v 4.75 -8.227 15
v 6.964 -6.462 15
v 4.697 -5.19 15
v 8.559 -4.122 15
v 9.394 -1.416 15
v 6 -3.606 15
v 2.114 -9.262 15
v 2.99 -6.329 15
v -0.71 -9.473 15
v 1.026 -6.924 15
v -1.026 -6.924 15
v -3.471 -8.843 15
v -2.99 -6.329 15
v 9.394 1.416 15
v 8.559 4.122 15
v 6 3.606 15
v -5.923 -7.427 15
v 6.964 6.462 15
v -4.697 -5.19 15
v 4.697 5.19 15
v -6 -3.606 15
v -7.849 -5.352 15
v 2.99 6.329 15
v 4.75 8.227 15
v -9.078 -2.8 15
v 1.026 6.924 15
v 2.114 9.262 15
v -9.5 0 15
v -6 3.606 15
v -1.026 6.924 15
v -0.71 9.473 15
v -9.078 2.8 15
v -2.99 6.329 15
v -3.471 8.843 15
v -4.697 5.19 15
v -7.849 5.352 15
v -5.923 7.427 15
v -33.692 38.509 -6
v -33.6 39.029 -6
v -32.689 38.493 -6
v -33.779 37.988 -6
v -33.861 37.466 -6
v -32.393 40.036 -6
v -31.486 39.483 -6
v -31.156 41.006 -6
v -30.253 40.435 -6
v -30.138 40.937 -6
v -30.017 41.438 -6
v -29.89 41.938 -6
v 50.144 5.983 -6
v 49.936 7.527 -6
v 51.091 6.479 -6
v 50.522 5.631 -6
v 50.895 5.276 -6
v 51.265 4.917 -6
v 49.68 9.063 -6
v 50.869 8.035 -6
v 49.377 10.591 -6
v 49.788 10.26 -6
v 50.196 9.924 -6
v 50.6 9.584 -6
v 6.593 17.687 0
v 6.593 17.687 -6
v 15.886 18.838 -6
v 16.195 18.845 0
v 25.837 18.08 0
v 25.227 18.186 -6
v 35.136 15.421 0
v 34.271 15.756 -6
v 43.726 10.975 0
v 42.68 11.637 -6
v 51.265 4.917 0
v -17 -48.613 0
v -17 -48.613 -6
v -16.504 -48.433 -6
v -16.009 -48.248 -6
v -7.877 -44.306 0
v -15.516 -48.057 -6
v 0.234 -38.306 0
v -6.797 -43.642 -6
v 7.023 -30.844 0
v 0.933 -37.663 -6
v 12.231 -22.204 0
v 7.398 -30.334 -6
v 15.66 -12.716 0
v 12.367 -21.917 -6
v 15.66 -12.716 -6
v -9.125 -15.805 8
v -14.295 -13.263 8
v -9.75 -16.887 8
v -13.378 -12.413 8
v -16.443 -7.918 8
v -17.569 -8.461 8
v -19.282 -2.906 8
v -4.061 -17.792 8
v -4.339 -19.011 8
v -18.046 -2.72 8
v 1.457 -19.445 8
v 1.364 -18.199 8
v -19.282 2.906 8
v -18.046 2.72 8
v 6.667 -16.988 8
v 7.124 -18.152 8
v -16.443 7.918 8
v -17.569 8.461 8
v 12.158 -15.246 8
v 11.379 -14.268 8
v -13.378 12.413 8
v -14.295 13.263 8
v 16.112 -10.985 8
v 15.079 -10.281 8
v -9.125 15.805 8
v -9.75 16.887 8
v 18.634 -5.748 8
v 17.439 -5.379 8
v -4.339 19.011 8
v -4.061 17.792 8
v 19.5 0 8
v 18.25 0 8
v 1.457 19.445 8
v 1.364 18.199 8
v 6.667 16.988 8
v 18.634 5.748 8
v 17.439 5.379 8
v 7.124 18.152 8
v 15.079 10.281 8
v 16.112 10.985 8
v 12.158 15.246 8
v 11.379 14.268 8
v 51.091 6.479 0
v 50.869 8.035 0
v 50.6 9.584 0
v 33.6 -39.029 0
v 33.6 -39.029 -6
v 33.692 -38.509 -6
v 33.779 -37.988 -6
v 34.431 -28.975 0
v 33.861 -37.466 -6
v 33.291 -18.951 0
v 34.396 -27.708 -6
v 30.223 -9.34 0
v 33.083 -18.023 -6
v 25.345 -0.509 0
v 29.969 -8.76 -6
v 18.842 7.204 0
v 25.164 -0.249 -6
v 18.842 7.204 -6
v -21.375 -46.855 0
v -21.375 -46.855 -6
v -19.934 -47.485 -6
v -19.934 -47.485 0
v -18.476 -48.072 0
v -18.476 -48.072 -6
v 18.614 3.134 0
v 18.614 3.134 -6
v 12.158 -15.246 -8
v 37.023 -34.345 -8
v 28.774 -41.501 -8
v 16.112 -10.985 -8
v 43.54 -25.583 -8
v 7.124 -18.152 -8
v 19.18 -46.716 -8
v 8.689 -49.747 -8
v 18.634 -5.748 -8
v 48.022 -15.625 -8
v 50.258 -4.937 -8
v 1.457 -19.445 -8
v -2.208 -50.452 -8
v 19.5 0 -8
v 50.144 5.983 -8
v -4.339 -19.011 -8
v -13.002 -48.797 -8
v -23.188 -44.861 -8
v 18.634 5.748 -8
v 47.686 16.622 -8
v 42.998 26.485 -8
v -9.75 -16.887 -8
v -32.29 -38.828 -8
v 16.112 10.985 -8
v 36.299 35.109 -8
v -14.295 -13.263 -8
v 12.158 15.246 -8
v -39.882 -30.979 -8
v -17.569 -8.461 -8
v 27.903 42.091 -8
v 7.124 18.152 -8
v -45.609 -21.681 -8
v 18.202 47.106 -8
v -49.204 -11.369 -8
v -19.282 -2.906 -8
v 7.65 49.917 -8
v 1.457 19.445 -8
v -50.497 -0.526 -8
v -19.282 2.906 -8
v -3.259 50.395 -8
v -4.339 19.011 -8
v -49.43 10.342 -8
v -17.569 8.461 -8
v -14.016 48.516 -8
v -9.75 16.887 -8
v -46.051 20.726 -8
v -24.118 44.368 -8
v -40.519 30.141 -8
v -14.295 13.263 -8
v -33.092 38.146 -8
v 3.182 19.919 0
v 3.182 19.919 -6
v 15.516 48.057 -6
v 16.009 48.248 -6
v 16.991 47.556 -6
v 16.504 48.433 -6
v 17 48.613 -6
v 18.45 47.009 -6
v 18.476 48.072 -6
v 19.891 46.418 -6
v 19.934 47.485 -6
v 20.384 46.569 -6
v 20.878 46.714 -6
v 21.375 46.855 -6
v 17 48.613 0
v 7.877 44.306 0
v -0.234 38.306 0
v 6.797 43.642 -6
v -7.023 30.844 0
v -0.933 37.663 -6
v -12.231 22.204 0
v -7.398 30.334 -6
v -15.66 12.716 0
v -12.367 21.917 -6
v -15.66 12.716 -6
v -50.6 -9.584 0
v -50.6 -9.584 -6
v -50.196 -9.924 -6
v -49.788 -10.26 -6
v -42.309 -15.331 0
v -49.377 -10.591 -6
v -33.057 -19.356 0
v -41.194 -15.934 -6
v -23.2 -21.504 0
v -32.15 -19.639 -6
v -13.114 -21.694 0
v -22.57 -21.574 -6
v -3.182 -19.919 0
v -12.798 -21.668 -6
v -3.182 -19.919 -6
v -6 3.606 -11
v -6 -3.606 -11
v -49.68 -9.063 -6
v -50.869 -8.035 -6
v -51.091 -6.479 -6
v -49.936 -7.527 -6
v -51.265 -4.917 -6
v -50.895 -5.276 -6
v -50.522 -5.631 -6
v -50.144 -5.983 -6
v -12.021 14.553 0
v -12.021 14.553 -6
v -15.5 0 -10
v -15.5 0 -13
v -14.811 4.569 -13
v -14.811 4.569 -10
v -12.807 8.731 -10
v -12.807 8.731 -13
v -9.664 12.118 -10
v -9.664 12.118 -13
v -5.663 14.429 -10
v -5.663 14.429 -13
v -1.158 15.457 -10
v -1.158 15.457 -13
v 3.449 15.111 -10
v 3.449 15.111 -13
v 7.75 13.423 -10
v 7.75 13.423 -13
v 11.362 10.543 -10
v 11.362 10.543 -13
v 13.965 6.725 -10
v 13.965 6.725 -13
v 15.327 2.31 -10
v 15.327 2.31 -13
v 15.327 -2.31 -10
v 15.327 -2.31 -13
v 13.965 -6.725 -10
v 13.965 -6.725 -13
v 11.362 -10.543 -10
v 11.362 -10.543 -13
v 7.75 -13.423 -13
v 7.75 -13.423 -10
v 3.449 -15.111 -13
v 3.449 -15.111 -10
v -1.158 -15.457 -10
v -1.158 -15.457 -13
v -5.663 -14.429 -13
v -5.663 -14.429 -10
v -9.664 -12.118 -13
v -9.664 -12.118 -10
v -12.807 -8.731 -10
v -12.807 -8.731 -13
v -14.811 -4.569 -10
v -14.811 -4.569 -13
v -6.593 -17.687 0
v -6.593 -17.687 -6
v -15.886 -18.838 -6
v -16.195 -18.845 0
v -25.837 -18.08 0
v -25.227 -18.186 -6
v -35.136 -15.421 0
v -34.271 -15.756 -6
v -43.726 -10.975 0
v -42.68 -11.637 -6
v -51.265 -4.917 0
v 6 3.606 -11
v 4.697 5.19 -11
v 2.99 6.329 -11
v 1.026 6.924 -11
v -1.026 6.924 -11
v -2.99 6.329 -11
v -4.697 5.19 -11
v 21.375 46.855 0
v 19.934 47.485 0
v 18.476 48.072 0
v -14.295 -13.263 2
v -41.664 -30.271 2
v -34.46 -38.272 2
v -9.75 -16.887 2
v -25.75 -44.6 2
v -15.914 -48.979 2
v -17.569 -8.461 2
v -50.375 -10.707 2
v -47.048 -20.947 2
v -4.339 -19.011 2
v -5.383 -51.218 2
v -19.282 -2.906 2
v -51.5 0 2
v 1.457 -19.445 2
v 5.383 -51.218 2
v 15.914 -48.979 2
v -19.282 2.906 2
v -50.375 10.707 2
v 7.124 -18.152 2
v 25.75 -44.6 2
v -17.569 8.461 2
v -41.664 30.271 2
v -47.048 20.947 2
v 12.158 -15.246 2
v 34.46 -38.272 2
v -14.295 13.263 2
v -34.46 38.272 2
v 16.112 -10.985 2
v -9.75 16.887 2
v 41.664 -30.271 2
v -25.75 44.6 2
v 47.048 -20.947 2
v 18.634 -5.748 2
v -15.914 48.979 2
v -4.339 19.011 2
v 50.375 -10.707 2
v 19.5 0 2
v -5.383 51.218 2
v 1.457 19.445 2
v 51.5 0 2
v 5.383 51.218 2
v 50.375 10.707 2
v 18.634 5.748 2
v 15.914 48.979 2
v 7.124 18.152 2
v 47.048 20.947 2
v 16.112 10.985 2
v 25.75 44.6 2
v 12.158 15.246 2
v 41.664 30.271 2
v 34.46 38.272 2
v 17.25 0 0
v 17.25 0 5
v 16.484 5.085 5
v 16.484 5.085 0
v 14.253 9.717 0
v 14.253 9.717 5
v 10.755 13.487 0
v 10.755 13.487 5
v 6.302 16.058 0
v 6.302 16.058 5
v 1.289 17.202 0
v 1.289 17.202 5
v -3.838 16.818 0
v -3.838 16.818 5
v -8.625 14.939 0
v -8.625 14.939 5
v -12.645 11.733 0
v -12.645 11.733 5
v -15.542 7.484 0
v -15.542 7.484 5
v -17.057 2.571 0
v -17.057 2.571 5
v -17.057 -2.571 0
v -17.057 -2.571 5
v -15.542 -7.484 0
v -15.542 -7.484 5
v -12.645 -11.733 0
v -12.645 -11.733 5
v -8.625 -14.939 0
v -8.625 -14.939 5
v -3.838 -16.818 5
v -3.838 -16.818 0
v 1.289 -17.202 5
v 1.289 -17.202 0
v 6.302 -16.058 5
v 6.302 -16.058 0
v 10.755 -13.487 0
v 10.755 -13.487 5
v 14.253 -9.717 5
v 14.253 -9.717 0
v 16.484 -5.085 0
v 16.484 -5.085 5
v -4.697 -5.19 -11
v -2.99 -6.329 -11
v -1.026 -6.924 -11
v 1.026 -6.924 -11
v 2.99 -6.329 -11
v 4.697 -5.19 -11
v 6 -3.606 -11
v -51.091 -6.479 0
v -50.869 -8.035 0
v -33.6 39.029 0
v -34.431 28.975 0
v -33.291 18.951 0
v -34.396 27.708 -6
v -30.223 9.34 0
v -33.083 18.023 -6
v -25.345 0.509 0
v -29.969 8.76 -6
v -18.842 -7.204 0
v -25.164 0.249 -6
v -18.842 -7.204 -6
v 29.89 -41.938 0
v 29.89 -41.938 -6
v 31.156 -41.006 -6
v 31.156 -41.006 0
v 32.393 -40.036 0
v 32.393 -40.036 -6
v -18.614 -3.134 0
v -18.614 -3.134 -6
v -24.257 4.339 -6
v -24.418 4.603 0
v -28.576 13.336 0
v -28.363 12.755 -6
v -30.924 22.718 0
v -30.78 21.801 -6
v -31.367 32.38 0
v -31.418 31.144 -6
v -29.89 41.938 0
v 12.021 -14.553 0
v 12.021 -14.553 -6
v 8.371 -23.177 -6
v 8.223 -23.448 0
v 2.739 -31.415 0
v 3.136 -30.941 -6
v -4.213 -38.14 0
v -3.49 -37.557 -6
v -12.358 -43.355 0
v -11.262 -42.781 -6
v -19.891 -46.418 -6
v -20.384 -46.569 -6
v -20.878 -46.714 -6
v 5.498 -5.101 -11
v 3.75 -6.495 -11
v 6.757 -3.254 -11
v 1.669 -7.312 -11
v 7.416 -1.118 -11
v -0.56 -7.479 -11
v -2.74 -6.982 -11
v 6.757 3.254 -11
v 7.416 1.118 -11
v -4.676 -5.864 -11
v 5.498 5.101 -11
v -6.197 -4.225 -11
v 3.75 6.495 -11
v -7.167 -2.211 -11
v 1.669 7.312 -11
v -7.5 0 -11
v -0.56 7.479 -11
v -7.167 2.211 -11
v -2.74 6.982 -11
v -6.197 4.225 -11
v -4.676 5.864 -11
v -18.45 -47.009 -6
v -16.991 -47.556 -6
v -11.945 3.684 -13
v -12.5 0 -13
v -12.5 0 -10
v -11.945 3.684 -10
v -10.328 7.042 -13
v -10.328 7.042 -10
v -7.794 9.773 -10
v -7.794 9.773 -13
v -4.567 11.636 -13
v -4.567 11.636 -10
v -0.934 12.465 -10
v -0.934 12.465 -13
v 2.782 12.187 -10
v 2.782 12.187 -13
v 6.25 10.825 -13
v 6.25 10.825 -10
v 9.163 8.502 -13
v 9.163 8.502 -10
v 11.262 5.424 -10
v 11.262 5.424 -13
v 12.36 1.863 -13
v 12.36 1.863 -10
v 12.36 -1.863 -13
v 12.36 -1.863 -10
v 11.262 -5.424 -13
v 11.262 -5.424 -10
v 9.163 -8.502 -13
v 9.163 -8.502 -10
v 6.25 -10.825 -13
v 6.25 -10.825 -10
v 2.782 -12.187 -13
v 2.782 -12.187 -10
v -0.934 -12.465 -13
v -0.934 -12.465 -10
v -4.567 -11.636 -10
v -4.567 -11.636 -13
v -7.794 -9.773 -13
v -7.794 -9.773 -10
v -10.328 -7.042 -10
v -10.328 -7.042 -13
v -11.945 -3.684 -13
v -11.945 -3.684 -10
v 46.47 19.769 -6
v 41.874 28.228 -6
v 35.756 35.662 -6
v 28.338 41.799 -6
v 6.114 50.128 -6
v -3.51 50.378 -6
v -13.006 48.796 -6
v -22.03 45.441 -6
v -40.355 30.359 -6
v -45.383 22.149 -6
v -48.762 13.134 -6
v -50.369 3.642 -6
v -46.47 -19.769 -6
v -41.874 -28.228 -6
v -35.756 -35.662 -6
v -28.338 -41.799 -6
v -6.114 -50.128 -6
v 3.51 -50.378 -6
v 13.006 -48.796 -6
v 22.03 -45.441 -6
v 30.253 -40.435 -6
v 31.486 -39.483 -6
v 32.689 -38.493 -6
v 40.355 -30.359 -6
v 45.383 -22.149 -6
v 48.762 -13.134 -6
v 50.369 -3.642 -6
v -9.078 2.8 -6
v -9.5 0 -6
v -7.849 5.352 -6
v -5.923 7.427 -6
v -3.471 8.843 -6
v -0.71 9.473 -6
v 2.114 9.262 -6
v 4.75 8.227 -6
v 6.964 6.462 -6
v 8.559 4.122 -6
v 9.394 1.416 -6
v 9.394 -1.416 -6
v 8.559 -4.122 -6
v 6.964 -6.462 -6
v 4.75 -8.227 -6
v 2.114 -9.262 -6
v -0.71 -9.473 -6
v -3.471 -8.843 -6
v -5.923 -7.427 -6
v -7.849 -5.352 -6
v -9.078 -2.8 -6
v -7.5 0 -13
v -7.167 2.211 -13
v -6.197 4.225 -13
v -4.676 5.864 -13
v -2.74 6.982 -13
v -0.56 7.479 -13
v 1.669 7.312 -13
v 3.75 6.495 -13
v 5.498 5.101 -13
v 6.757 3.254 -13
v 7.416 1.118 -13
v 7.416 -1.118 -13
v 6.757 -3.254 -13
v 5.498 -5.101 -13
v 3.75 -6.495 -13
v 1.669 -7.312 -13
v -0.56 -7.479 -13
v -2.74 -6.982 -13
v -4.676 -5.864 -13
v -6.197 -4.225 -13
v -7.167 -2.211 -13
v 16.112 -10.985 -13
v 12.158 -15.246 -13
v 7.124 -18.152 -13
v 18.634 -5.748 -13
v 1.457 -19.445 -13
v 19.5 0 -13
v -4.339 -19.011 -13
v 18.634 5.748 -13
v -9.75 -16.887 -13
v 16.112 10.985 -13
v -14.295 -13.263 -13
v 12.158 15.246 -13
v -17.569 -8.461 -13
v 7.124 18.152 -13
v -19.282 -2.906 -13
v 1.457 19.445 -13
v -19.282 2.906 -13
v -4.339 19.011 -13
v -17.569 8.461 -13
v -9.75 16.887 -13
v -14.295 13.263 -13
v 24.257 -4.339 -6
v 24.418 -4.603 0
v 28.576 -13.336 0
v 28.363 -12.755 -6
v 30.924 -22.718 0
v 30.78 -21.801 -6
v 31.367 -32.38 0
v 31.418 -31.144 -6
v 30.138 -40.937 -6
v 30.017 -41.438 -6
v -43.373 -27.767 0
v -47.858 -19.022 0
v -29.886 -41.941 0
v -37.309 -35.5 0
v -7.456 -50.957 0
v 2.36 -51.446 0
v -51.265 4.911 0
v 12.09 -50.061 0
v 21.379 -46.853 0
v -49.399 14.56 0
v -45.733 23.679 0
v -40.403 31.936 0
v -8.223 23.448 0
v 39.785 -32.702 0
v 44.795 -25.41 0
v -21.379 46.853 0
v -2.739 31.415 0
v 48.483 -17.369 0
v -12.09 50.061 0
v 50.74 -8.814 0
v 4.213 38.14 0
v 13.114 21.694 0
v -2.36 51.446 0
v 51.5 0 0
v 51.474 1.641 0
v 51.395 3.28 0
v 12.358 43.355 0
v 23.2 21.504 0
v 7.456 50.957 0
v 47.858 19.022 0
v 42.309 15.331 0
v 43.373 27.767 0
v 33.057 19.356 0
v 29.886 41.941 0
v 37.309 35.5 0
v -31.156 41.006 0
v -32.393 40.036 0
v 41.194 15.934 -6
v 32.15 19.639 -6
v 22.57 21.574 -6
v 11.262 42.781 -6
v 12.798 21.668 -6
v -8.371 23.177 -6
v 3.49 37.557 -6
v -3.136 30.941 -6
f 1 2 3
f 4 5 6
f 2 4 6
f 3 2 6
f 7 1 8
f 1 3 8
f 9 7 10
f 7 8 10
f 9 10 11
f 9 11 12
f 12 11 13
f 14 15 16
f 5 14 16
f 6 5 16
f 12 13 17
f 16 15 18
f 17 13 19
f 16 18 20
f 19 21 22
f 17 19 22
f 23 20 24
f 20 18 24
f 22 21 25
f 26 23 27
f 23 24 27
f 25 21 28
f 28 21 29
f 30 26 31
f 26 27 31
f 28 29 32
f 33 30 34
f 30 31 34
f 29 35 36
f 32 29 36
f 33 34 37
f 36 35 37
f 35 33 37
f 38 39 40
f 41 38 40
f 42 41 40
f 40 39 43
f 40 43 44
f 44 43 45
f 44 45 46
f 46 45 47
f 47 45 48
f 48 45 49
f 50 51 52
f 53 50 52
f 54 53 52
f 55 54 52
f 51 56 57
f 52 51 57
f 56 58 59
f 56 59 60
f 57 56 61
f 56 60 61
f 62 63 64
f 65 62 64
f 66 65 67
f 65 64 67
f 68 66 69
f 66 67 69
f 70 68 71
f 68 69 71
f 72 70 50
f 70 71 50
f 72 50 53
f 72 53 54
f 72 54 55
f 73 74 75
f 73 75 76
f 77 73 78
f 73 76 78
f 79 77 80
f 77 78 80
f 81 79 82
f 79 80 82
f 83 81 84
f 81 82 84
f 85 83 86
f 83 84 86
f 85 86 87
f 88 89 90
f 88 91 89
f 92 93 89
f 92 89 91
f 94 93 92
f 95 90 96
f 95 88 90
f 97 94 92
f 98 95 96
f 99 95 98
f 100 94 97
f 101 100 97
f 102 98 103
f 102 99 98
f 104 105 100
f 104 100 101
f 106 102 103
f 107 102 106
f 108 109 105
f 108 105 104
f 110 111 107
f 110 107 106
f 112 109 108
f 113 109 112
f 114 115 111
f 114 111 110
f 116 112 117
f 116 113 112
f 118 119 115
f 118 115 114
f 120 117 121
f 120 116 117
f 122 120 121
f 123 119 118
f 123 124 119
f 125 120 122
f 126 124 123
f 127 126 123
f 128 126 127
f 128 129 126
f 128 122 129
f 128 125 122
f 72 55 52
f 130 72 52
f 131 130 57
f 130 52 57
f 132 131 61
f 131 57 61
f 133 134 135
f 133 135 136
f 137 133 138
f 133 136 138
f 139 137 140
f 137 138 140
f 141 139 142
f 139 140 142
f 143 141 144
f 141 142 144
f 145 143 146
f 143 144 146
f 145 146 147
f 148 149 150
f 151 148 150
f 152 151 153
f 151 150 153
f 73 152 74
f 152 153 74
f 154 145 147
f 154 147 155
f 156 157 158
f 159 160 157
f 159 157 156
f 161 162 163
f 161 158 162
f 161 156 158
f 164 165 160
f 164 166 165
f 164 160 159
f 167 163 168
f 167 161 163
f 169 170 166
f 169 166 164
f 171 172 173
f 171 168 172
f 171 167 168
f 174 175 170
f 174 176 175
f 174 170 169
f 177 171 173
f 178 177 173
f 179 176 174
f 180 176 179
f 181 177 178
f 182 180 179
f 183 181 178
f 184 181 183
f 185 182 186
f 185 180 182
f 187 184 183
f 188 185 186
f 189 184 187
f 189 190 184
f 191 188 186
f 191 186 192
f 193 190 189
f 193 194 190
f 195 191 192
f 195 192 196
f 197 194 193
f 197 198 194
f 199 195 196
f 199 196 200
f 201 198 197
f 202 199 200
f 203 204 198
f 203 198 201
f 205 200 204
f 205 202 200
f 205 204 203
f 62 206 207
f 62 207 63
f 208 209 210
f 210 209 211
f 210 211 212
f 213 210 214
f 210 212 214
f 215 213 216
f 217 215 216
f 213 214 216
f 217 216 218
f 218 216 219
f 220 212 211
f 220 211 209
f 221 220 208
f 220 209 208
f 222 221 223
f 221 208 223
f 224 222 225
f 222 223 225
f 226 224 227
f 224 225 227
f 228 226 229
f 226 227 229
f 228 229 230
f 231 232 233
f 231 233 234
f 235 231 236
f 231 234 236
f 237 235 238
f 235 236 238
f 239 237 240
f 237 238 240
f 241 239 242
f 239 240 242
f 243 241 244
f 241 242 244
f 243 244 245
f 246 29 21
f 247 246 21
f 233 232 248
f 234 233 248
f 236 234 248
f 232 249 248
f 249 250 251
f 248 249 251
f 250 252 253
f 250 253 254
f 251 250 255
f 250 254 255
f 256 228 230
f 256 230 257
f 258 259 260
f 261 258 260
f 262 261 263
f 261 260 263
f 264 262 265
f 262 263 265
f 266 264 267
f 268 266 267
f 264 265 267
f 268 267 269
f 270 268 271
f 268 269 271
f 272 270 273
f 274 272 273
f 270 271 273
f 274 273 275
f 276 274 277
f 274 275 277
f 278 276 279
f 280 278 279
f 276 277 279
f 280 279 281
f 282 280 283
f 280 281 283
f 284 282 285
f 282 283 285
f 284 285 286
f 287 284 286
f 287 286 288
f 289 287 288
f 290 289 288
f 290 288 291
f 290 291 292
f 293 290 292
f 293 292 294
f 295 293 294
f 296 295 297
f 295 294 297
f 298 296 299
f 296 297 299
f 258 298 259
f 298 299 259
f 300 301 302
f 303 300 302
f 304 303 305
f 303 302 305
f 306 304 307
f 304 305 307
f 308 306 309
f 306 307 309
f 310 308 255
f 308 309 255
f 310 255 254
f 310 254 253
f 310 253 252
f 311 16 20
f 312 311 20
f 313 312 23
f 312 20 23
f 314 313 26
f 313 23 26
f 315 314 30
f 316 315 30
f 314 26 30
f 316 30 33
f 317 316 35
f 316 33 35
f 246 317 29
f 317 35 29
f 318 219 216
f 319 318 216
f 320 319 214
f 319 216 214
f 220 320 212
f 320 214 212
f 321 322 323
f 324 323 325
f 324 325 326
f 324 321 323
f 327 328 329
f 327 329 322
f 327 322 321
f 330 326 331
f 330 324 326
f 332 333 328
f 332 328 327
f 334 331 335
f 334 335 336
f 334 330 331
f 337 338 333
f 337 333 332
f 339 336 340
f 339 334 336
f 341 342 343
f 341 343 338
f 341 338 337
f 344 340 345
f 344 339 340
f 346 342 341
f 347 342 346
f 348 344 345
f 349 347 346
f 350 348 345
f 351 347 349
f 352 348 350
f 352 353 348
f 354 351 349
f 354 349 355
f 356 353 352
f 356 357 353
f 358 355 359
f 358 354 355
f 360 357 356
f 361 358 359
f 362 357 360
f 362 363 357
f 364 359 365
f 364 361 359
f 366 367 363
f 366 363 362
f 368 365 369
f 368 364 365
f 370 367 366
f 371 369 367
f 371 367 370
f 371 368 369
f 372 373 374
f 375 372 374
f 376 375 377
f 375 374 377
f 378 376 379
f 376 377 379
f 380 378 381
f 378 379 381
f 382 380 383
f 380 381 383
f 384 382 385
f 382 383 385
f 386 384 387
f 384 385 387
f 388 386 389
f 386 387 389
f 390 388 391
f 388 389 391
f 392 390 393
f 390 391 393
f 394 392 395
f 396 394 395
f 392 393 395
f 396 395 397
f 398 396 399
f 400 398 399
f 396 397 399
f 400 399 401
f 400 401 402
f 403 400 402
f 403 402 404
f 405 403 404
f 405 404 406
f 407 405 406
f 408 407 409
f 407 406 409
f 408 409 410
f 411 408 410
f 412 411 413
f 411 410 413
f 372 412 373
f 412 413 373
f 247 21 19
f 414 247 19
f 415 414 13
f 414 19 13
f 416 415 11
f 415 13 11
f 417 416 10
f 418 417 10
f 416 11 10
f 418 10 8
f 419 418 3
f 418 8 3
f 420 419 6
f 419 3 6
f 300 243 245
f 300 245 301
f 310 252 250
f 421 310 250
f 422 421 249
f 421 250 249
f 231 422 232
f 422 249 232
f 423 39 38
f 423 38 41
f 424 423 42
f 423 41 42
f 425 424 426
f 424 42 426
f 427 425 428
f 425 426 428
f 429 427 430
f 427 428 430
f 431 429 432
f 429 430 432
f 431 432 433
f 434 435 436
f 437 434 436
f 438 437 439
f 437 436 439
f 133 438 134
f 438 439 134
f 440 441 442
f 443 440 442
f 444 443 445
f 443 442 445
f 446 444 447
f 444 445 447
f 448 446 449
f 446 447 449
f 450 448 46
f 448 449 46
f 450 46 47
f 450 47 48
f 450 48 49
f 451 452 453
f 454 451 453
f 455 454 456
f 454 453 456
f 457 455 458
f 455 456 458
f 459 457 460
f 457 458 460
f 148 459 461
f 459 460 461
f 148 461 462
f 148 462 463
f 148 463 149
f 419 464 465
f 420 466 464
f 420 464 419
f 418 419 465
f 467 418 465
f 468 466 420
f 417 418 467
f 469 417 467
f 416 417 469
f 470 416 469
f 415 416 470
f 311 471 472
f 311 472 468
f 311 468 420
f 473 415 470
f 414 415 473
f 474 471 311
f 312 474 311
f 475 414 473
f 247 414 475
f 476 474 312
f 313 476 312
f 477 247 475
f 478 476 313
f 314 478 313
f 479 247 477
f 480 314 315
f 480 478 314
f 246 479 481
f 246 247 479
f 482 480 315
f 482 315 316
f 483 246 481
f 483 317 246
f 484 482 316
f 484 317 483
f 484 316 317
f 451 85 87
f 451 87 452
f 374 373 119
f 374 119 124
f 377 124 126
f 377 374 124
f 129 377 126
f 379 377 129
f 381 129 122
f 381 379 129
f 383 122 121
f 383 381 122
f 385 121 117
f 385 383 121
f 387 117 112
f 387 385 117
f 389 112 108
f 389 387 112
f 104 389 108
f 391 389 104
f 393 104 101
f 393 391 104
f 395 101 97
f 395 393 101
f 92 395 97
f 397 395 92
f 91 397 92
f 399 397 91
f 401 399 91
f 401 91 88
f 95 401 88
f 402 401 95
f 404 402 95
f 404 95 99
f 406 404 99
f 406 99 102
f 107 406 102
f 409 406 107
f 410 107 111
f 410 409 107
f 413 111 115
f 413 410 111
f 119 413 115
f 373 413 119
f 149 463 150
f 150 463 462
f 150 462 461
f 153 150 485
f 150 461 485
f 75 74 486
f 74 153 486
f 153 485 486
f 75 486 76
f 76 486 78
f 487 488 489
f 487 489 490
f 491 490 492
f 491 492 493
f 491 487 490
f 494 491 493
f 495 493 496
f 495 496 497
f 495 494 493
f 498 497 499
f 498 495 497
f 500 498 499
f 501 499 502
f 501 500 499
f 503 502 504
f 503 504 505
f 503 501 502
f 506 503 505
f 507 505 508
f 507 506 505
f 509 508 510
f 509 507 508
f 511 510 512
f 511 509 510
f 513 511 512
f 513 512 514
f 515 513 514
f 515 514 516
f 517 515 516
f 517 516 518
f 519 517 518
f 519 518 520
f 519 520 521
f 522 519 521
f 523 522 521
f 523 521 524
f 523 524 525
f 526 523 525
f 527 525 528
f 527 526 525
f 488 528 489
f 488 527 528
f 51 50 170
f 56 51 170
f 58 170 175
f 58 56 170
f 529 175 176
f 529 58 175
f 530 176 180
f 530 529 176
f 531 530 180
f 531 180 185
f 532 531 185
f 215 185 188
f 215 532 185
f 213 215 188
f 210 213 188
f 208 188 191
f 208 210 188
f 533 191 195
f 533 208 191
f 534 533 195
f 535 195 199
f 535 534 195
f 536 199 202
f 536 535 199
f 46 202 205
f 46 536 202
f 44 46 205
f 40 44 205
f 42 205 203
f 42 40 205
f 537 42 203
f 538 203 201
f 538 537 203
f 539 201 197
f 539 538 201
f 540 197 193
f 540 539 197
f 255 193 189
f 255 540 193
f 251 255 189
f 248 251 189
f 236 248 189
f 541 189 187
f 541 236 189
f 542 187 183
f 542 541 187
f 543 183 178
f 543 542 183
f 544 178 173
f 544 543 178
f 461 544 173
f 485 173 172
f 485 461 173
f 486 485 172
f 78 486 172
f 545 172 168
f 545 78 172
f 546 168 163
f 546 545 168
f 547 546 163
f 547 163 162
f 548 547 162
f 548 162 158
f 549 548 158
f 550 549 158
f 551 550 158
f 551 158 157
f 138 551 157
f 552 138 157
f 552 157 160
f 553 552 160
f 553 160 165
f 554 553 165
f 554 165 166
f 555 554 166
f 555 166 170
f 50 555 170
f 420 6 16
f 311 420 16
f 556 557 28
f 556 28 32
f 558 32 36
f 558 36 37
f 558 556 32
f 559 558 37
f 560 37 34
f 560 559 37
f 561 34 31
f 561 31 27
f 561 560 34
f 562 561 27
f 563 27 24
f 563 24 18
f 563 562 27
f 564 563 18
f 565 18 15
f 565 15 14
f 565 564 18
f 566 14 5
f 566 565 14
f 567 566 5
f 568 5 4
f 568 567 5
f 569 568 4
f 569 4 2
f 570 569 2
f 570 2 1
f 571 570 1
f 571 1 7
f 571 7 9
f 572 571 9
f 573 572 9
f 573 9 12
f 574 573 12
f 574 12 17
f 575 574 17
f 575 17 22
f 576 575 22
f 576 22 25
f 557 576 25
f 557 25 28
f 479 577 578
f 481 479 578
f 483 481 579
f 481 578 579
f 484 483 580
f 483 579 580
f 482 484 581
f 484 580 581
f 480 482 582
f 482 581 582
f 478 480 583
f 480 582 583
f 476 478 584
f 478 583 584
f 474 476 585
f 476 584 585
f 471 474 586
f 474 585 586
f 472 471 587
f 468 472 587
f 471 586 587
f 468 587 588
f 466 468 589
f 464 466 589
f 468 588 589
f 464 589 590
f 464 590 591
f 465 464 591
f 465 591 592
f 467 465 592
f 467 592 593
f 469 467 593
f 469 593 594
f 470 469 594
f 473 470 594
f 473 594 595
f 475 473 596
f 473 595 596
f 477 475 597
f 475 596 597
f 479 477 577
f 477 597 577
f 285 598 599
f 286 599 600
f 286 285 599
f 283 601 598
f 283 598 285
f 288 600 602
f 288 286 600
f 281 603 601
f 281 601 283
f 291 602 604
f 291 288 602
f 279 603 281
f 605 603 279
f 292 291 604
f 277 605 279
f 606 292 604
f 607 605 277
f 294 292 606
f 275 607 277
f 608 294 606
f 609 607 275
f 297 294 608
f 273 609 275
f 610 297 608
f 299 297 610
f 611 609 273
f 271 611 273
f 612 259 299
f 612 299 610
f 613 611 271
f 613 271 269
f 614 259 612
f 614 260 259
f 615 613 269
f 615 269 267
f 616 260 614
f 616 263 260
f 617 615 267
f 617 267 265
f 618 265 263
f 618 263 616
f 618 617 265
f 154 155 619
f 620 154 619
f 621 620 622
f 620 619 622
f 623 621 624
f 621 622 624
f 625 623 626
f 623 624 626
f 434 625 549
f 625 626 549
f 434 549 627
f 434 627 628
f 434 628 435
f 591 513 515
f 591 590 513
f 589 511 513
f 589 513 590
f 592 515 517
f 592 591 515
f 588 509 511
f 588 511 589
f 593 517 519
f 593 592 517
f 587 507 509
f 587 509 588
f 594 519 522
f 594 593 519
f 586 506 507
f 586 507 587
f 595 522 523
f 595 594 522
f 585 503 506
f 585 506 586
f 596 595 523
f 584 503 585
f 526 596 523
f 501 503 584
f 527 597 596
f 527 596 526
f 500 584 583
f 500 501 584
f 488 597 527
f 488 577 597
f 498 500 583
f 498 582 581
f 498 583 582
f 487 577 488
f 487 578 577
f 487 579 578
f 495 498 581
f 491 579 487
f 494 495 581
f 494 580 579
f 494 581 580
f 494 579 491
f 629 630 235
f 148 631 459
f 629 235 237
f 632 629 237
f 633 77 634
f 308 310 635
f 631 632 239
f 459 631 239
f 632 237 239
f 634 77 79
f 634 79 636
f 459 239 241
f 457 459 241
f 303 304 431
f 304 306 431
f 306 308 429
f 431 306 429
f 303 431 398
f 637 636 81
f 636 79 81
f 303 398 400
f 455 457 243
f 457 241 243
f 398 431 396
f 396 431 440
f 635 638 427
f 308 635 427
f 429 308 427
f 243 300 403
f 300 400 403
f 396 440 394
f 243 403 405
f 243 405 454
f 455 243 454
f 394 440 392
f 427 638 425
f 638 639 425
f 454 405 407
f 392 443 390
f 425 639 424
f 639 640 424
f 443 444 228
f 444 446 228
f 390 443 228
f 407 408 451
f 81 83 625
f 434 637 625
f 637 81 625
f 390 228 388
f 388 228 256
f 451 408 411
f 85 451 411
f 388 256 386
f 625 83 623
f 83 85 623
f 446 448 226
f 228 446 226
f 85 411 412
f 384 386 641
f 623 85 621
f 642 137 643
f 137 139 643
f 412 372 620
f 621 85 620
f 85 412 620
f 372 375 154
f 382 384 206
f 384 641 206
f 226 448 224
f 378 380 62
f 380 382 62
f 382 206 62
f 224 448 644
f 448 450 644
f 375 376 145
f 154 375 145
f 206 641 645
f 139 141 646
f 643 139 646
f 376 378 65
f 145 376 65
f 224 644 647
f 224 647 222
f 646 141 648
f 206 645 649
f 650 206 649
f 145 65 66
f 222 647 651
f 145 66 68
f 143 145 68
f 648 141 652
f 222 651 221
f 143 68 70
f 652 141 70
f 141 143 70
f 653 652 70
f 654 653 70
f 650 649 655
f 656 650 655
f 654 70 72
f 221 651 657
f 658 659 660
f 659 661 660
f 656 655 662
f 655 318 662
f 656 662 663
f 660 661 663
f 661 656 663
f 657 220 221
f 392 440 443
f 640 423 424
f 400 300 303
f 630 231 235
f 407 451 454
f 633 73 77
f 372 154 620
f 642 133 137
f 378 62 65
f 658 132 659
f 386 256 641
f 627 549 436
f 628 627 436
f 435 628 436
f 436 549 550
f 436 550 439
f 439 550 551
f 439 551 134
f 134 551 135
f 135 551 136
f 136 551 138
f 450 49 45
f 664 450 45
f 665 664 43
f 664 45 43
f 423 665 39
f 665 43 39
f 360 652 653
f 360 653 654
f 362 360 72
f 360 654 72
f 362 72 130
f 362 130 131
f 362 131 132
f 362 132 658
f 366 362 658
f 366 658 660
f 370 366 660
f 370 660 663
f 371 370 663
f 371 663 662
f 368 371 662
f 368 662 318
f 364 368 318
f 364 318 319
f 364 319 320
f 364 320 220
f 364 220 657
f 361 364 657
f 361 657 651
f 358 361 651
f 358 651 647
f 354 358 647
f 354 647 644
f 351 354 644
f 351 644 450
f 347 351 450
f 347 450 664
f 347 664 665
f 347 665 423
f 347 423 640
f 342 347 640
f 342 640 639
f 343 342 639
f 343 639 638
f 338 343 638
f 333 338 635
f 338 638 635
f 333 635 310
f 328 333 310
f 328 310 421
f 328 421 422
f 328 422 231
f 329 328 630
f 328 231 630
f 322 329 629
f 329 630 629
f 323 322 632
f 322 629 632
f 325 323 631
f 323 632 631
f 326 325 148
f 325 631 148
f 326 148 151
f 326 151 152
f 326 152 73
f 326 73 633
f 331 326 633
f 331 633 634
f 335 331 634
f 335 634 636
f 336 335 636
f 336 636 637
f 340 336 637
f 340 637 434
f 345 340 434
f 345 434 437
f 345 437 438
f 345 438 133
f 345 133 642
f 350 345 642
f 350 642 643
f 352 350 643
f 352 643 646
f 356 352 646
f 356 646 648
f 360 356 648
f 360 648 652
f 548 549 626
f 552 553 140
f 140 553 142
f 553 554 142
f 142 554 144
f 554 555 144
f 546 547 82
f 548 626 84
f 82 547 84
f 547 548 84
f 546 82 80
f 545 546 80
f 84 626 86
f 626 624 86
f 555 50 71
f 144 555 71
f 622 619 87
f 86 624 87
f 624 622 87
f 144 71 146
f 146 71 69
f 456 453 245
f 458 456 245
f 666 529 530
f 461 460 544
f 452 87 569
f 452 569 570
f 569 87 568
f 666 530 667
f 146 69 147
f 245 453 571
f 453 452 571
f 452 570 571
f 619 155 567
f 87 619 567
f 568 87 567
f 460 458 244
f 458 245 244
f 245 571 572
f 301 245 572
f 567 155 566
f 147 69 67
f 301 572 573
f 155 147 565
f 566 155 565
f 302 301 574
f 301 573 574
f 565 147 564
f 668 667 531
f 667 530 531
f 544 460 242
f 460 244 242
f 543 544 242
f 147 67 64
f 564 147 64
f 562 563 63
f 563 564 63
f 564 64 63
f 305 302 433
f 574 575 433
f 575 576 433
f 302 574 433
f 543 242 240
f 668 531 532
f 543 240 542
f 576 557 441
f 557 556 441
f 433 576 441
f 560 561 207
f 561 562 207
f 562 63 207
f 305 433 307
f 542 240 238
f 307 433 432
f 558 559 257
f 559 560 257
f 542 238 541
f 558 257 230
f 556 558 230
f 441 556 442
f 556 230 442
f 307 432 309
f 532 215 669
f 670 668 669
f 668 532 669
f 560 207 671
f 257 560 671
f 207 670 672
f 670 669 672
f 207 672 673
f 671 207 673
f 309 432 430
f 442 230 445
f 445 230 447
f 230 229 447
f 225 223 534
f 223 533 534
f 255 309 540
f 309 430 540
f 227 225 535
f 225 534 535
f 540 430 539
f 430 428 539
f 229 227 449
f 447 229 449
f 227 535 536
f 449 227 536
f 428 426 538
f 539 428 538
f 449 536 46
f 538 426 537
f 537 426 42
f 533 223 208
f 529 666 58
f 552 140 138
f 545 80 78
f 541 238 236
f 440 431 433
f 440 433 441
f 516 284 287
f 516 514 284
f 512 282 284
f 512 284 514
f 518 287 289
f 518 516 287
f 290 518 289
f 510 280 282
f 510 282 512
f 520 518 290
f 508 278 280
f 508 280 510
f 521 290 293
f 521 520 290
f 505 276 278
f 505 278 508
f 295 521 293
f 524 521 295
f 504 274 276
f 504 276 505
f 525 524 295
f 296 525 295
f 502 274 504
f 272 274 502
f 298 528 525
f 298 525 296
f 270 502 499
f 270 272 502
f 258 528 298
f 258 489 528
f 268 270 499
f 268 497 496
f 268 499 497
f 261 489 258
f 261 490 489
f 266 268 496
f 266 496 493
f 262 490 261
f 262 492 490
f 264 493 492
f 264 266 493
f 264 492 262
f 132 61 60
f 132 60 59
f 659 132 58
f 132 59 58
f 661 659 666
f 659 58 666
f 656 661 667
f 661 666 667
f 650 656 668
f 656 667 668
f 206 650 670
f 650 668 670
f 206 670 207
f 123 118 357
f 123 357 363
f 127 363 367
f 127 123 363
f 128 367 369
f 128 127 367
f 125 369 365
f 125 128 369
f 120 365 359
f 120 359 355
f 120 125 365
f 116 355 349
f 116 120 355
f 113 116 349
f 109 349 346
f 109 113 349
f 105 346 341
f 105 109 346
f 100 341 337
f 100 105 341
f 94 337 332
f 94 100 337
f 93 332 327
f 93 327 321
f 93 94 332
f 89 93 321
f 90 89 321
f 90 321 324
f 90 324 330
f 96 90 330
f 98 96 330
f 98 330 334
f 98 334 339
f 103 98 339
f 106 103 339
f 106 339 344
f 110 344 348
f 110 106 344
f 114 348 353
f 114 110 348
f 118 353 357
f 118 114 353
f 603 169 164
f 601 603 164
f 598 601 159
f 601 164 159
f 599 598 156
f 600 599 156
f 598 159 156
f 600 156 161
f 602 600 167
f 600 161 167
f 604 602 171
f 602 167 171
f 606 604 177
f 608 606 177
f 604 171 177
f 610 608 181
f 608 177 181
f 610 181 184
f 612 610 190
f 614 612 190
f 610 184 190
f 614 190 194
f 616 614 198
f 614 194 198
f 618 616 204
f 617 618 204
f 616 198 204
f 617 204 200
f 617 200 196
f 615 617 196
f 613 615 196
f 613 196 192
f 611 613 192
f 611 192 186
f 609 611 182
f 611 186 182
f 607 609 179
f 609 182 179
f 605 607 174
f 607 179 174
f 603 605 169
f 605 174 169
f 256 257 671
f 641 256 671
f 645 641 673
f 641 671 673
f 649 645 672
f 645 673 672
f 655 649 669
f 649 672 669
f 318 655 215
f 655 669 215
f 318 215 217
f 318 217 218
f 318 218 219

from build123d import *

# Parameters (mm, degrees)
SKETCH1_R           = 51.5
BOSS_EXTRUDE1_DEPTH = 2
SKETCH2_R           = 17.25
CUT_EXTRUDE1_DEPTH  = 2
BOSS_EXTRUDE3_START = 6
BOSS_EXTRUDE3_DEPTH = 6
CIRPATTERN2_COUNT   = 6
BOSS_EXTRUDE4_START = 6
SKETCH5_R           = 19.5
SKETCH5_R_2         = 17.25
BOSS_EXTRUDE4_DEPTH = 6
CHAMFER1_SIZE       = 1
CHAMFER1_SIZE2      = 3
BOSS_EXTRUDE5_START = 2
SKETCH6_R           = 51.5
BOSS_EXTRUDE5_DEPTH = 2
SKETCH7_R           = 19.5
BOSS_EXTRUDE6_DEPTH = 5
SKETCH8_R           = 9.5
BOSS_EXTRUDE7_DEPTH = 28
CUT_EXTRUDE2_DEPTH  = 79.028840822
SKETCH10_R          = 7.5
CUT_EXTRUDE3_DEPTH  = 2
SKETCH11_R          = 15.5
SKETCH11_R_2        = 12.5
CUT_EXTRUDE4_DEPTH  = 3
SKETCH12_R          = 57.826662367
SKETCH12_R_2        = 50.5
CUT_EXTRUDE5_DEPTH  = 50


with BuildPart() as part:
    # Sketch1 → Boss-Extrude1 (new body)
    with BuildSketch(Plane.XY):
        Circle(SKETCH1_R)
    extrude(amount=BOSS_EXTRUDE1_DEPTH)

    # Sketch2 → Cut-Extrude1 (cut)
    with BuildSketch(Plane.XY.offset(2)):
        Circle(SKETCH2_R)
    extrude(amount=-CUT_EXTRUDE1_DEPTH, mode=Mode.SUBTRACT)

    # Sketch4 → Boss-Extrude3 (add)
    with BuildSketch(Plane(origin=(0, 0, 0), x_dir=(-1, 0, 0), z_dir=(0, 0, -1)).offset(BOSS_EXTRUDE3_START)):
        with BuildLine():
            Line((15.659504395, 12.715698759), (12.020980416, 14.553474713))
            ThreePointArc((12.020980416, 14.553474713), (-0.569243838, 34.9508437), (-21.374545455, 46.854869615))
            ThreePointArc((-21.374545455, 46.854869615), (-19.207405538, 47.784156082), (-17, 48.613269793))
            ThreePointArc((-17, 48.613269793), (3.810982012, 34.741493963), (15.659504395, 12.715698759))
        make_face()
    boss_extrude3 = extrude(amount=-BOSS_EXTRUDE3_DEPTH)

    # CirPattern2: Boss-Extrude3 ×6 about axis
    cirpattern2_axis = Axis((0, 0, 0), (0, 0, 1))
    for i in range(1, CIRPATTERN2_COUNT):
        add(boss_extrude3.rotate(cirpattern2_axis, i * 360 / CIRPATTERN2_COUNT))

    # Sketch5 → Boss-Extrude4 (add)
    with BuildSketch(Plane.XY.offset(2).offset(BOSS_EXTRUDE4_START)):
        Circle(SKETCH5_R)
        Circle(SKETCH5_R_2, mode=Mode.SUBTRACT)
    extrude(amount=-BOSS_EXTRUDE4_DEPTH)

    # Chamfer1
    chamfer1_edges = [part.edges().sort_by_distance(p)[0] for p in [
        (-17.25, 0, 8),
    ]]
    chamfer1_side = [part.faces().sort_by_distance(p)[0] for p in [
        (-18.948456711, 0, 8),
    ]]
    chamfer(chamfer1_edges, length=CHAMFER1_SIZE, length2=CHAMFER1_SIZE2, reference=chamfer1_side[0])

    # Sketch6 → Boss-Extrude5 (add)
    with BuildSketch(Plane(origin=(0, 0, -6), x_dir=(-1, 0, 0), z_dir=(0, 0, -1)).offset(BOSS_EXTRUDE5_START)):
        Circle(SKETCH6_R)
    extrude(amount=-BOSS_EXTRUDE5_DEPTH)

    # Sketch7 → Boss-Extrude6 (add)
    with BuildSketch(Plane(origin=(0, 0, -8), x_dir=(-1, 0, 0), z_dir=(0, 0, -1))):
        with Locations(Location((0, 0, 0), (0, 0, 180))):
            Circle(SKETCH7_R)
    extrude(amount=BOSS_EXTRUDE6_DEPTH)

    # Sketch8 → Boss-Extrude7 (add)
    with BuildSketch(Plane(origin=(0, 0, -13), x_dir=(-1, 0, 0), z_dir=(0, 0, -1))):
        Circle(SKETCH8_R)
    extrude(amount=-BOSS_EXTRUDE7_DEPTH)

    # Sketch9 → Cut-Extrude2 (cut, through all)
    with BuildSketch(Plane.XY.offset(15)):
        with BuildLine():
            Line((6, 0), (6, 3.605551275))
            ThreePointArc((6, 3.605551275), (0, 7), (-6, 3.605551275))
            Line((-6, 3.605551275), (-6, 0))
            Line((-6, 0), (-6, -3.605551275))
            ThreePointArc((-6, -3.605551275), (0, -7), (6, -3.605551275))
            Line((6, -3.605551275), (6, 0))
        make_face()
    extrude(amount=-CUT_EXTRUDE2_DEPTH, mode=Mode.SUBTRACT)

    # Sketch10 → Cut-Extrude3 (cut)
    with BuildSketch(Plane(origin=(0, 0, -13), x_dir=(-1, 0, 0), z_dir=(0, 0, -1))):
        Circle(SKETCH10_R)
    extrude(amount=-CUT_EXTRUDE3_DEPTH, mode=Mode.SUBTRACT)

    # Sketch11 → Cut-Extrude4 (cut)
    with BuildSketch(Plane(origin=(0, 0, -13), x_dir=(-1, 0, 0), z_dir=(0, 0, -1))):
        Circle(SKETCH11_R)
        Circle(SKETCH11_R_2, mode=Mode.SUBTRACT)
    extrude(amount=-CUT_EXTRUDE4_DEPTH, mode=Mode.SUBTRACT)

    # Sketch12 → Cut-Extrude5 (cut)
    with BuildSketch(Plane.XY.offset(-6)):
        Circle(SKETCH12_R)
        with Locations(Location((0, 0, 0), (0, 0, 6.803897331))):
            Circle(SKETCH12_R_2, mode=Mode.SUBTRACT)
    extrude(amount=-CUT_EXTRUDE5_DEPTH, mode=Mode.SUBTRACT)


solid = part.part
